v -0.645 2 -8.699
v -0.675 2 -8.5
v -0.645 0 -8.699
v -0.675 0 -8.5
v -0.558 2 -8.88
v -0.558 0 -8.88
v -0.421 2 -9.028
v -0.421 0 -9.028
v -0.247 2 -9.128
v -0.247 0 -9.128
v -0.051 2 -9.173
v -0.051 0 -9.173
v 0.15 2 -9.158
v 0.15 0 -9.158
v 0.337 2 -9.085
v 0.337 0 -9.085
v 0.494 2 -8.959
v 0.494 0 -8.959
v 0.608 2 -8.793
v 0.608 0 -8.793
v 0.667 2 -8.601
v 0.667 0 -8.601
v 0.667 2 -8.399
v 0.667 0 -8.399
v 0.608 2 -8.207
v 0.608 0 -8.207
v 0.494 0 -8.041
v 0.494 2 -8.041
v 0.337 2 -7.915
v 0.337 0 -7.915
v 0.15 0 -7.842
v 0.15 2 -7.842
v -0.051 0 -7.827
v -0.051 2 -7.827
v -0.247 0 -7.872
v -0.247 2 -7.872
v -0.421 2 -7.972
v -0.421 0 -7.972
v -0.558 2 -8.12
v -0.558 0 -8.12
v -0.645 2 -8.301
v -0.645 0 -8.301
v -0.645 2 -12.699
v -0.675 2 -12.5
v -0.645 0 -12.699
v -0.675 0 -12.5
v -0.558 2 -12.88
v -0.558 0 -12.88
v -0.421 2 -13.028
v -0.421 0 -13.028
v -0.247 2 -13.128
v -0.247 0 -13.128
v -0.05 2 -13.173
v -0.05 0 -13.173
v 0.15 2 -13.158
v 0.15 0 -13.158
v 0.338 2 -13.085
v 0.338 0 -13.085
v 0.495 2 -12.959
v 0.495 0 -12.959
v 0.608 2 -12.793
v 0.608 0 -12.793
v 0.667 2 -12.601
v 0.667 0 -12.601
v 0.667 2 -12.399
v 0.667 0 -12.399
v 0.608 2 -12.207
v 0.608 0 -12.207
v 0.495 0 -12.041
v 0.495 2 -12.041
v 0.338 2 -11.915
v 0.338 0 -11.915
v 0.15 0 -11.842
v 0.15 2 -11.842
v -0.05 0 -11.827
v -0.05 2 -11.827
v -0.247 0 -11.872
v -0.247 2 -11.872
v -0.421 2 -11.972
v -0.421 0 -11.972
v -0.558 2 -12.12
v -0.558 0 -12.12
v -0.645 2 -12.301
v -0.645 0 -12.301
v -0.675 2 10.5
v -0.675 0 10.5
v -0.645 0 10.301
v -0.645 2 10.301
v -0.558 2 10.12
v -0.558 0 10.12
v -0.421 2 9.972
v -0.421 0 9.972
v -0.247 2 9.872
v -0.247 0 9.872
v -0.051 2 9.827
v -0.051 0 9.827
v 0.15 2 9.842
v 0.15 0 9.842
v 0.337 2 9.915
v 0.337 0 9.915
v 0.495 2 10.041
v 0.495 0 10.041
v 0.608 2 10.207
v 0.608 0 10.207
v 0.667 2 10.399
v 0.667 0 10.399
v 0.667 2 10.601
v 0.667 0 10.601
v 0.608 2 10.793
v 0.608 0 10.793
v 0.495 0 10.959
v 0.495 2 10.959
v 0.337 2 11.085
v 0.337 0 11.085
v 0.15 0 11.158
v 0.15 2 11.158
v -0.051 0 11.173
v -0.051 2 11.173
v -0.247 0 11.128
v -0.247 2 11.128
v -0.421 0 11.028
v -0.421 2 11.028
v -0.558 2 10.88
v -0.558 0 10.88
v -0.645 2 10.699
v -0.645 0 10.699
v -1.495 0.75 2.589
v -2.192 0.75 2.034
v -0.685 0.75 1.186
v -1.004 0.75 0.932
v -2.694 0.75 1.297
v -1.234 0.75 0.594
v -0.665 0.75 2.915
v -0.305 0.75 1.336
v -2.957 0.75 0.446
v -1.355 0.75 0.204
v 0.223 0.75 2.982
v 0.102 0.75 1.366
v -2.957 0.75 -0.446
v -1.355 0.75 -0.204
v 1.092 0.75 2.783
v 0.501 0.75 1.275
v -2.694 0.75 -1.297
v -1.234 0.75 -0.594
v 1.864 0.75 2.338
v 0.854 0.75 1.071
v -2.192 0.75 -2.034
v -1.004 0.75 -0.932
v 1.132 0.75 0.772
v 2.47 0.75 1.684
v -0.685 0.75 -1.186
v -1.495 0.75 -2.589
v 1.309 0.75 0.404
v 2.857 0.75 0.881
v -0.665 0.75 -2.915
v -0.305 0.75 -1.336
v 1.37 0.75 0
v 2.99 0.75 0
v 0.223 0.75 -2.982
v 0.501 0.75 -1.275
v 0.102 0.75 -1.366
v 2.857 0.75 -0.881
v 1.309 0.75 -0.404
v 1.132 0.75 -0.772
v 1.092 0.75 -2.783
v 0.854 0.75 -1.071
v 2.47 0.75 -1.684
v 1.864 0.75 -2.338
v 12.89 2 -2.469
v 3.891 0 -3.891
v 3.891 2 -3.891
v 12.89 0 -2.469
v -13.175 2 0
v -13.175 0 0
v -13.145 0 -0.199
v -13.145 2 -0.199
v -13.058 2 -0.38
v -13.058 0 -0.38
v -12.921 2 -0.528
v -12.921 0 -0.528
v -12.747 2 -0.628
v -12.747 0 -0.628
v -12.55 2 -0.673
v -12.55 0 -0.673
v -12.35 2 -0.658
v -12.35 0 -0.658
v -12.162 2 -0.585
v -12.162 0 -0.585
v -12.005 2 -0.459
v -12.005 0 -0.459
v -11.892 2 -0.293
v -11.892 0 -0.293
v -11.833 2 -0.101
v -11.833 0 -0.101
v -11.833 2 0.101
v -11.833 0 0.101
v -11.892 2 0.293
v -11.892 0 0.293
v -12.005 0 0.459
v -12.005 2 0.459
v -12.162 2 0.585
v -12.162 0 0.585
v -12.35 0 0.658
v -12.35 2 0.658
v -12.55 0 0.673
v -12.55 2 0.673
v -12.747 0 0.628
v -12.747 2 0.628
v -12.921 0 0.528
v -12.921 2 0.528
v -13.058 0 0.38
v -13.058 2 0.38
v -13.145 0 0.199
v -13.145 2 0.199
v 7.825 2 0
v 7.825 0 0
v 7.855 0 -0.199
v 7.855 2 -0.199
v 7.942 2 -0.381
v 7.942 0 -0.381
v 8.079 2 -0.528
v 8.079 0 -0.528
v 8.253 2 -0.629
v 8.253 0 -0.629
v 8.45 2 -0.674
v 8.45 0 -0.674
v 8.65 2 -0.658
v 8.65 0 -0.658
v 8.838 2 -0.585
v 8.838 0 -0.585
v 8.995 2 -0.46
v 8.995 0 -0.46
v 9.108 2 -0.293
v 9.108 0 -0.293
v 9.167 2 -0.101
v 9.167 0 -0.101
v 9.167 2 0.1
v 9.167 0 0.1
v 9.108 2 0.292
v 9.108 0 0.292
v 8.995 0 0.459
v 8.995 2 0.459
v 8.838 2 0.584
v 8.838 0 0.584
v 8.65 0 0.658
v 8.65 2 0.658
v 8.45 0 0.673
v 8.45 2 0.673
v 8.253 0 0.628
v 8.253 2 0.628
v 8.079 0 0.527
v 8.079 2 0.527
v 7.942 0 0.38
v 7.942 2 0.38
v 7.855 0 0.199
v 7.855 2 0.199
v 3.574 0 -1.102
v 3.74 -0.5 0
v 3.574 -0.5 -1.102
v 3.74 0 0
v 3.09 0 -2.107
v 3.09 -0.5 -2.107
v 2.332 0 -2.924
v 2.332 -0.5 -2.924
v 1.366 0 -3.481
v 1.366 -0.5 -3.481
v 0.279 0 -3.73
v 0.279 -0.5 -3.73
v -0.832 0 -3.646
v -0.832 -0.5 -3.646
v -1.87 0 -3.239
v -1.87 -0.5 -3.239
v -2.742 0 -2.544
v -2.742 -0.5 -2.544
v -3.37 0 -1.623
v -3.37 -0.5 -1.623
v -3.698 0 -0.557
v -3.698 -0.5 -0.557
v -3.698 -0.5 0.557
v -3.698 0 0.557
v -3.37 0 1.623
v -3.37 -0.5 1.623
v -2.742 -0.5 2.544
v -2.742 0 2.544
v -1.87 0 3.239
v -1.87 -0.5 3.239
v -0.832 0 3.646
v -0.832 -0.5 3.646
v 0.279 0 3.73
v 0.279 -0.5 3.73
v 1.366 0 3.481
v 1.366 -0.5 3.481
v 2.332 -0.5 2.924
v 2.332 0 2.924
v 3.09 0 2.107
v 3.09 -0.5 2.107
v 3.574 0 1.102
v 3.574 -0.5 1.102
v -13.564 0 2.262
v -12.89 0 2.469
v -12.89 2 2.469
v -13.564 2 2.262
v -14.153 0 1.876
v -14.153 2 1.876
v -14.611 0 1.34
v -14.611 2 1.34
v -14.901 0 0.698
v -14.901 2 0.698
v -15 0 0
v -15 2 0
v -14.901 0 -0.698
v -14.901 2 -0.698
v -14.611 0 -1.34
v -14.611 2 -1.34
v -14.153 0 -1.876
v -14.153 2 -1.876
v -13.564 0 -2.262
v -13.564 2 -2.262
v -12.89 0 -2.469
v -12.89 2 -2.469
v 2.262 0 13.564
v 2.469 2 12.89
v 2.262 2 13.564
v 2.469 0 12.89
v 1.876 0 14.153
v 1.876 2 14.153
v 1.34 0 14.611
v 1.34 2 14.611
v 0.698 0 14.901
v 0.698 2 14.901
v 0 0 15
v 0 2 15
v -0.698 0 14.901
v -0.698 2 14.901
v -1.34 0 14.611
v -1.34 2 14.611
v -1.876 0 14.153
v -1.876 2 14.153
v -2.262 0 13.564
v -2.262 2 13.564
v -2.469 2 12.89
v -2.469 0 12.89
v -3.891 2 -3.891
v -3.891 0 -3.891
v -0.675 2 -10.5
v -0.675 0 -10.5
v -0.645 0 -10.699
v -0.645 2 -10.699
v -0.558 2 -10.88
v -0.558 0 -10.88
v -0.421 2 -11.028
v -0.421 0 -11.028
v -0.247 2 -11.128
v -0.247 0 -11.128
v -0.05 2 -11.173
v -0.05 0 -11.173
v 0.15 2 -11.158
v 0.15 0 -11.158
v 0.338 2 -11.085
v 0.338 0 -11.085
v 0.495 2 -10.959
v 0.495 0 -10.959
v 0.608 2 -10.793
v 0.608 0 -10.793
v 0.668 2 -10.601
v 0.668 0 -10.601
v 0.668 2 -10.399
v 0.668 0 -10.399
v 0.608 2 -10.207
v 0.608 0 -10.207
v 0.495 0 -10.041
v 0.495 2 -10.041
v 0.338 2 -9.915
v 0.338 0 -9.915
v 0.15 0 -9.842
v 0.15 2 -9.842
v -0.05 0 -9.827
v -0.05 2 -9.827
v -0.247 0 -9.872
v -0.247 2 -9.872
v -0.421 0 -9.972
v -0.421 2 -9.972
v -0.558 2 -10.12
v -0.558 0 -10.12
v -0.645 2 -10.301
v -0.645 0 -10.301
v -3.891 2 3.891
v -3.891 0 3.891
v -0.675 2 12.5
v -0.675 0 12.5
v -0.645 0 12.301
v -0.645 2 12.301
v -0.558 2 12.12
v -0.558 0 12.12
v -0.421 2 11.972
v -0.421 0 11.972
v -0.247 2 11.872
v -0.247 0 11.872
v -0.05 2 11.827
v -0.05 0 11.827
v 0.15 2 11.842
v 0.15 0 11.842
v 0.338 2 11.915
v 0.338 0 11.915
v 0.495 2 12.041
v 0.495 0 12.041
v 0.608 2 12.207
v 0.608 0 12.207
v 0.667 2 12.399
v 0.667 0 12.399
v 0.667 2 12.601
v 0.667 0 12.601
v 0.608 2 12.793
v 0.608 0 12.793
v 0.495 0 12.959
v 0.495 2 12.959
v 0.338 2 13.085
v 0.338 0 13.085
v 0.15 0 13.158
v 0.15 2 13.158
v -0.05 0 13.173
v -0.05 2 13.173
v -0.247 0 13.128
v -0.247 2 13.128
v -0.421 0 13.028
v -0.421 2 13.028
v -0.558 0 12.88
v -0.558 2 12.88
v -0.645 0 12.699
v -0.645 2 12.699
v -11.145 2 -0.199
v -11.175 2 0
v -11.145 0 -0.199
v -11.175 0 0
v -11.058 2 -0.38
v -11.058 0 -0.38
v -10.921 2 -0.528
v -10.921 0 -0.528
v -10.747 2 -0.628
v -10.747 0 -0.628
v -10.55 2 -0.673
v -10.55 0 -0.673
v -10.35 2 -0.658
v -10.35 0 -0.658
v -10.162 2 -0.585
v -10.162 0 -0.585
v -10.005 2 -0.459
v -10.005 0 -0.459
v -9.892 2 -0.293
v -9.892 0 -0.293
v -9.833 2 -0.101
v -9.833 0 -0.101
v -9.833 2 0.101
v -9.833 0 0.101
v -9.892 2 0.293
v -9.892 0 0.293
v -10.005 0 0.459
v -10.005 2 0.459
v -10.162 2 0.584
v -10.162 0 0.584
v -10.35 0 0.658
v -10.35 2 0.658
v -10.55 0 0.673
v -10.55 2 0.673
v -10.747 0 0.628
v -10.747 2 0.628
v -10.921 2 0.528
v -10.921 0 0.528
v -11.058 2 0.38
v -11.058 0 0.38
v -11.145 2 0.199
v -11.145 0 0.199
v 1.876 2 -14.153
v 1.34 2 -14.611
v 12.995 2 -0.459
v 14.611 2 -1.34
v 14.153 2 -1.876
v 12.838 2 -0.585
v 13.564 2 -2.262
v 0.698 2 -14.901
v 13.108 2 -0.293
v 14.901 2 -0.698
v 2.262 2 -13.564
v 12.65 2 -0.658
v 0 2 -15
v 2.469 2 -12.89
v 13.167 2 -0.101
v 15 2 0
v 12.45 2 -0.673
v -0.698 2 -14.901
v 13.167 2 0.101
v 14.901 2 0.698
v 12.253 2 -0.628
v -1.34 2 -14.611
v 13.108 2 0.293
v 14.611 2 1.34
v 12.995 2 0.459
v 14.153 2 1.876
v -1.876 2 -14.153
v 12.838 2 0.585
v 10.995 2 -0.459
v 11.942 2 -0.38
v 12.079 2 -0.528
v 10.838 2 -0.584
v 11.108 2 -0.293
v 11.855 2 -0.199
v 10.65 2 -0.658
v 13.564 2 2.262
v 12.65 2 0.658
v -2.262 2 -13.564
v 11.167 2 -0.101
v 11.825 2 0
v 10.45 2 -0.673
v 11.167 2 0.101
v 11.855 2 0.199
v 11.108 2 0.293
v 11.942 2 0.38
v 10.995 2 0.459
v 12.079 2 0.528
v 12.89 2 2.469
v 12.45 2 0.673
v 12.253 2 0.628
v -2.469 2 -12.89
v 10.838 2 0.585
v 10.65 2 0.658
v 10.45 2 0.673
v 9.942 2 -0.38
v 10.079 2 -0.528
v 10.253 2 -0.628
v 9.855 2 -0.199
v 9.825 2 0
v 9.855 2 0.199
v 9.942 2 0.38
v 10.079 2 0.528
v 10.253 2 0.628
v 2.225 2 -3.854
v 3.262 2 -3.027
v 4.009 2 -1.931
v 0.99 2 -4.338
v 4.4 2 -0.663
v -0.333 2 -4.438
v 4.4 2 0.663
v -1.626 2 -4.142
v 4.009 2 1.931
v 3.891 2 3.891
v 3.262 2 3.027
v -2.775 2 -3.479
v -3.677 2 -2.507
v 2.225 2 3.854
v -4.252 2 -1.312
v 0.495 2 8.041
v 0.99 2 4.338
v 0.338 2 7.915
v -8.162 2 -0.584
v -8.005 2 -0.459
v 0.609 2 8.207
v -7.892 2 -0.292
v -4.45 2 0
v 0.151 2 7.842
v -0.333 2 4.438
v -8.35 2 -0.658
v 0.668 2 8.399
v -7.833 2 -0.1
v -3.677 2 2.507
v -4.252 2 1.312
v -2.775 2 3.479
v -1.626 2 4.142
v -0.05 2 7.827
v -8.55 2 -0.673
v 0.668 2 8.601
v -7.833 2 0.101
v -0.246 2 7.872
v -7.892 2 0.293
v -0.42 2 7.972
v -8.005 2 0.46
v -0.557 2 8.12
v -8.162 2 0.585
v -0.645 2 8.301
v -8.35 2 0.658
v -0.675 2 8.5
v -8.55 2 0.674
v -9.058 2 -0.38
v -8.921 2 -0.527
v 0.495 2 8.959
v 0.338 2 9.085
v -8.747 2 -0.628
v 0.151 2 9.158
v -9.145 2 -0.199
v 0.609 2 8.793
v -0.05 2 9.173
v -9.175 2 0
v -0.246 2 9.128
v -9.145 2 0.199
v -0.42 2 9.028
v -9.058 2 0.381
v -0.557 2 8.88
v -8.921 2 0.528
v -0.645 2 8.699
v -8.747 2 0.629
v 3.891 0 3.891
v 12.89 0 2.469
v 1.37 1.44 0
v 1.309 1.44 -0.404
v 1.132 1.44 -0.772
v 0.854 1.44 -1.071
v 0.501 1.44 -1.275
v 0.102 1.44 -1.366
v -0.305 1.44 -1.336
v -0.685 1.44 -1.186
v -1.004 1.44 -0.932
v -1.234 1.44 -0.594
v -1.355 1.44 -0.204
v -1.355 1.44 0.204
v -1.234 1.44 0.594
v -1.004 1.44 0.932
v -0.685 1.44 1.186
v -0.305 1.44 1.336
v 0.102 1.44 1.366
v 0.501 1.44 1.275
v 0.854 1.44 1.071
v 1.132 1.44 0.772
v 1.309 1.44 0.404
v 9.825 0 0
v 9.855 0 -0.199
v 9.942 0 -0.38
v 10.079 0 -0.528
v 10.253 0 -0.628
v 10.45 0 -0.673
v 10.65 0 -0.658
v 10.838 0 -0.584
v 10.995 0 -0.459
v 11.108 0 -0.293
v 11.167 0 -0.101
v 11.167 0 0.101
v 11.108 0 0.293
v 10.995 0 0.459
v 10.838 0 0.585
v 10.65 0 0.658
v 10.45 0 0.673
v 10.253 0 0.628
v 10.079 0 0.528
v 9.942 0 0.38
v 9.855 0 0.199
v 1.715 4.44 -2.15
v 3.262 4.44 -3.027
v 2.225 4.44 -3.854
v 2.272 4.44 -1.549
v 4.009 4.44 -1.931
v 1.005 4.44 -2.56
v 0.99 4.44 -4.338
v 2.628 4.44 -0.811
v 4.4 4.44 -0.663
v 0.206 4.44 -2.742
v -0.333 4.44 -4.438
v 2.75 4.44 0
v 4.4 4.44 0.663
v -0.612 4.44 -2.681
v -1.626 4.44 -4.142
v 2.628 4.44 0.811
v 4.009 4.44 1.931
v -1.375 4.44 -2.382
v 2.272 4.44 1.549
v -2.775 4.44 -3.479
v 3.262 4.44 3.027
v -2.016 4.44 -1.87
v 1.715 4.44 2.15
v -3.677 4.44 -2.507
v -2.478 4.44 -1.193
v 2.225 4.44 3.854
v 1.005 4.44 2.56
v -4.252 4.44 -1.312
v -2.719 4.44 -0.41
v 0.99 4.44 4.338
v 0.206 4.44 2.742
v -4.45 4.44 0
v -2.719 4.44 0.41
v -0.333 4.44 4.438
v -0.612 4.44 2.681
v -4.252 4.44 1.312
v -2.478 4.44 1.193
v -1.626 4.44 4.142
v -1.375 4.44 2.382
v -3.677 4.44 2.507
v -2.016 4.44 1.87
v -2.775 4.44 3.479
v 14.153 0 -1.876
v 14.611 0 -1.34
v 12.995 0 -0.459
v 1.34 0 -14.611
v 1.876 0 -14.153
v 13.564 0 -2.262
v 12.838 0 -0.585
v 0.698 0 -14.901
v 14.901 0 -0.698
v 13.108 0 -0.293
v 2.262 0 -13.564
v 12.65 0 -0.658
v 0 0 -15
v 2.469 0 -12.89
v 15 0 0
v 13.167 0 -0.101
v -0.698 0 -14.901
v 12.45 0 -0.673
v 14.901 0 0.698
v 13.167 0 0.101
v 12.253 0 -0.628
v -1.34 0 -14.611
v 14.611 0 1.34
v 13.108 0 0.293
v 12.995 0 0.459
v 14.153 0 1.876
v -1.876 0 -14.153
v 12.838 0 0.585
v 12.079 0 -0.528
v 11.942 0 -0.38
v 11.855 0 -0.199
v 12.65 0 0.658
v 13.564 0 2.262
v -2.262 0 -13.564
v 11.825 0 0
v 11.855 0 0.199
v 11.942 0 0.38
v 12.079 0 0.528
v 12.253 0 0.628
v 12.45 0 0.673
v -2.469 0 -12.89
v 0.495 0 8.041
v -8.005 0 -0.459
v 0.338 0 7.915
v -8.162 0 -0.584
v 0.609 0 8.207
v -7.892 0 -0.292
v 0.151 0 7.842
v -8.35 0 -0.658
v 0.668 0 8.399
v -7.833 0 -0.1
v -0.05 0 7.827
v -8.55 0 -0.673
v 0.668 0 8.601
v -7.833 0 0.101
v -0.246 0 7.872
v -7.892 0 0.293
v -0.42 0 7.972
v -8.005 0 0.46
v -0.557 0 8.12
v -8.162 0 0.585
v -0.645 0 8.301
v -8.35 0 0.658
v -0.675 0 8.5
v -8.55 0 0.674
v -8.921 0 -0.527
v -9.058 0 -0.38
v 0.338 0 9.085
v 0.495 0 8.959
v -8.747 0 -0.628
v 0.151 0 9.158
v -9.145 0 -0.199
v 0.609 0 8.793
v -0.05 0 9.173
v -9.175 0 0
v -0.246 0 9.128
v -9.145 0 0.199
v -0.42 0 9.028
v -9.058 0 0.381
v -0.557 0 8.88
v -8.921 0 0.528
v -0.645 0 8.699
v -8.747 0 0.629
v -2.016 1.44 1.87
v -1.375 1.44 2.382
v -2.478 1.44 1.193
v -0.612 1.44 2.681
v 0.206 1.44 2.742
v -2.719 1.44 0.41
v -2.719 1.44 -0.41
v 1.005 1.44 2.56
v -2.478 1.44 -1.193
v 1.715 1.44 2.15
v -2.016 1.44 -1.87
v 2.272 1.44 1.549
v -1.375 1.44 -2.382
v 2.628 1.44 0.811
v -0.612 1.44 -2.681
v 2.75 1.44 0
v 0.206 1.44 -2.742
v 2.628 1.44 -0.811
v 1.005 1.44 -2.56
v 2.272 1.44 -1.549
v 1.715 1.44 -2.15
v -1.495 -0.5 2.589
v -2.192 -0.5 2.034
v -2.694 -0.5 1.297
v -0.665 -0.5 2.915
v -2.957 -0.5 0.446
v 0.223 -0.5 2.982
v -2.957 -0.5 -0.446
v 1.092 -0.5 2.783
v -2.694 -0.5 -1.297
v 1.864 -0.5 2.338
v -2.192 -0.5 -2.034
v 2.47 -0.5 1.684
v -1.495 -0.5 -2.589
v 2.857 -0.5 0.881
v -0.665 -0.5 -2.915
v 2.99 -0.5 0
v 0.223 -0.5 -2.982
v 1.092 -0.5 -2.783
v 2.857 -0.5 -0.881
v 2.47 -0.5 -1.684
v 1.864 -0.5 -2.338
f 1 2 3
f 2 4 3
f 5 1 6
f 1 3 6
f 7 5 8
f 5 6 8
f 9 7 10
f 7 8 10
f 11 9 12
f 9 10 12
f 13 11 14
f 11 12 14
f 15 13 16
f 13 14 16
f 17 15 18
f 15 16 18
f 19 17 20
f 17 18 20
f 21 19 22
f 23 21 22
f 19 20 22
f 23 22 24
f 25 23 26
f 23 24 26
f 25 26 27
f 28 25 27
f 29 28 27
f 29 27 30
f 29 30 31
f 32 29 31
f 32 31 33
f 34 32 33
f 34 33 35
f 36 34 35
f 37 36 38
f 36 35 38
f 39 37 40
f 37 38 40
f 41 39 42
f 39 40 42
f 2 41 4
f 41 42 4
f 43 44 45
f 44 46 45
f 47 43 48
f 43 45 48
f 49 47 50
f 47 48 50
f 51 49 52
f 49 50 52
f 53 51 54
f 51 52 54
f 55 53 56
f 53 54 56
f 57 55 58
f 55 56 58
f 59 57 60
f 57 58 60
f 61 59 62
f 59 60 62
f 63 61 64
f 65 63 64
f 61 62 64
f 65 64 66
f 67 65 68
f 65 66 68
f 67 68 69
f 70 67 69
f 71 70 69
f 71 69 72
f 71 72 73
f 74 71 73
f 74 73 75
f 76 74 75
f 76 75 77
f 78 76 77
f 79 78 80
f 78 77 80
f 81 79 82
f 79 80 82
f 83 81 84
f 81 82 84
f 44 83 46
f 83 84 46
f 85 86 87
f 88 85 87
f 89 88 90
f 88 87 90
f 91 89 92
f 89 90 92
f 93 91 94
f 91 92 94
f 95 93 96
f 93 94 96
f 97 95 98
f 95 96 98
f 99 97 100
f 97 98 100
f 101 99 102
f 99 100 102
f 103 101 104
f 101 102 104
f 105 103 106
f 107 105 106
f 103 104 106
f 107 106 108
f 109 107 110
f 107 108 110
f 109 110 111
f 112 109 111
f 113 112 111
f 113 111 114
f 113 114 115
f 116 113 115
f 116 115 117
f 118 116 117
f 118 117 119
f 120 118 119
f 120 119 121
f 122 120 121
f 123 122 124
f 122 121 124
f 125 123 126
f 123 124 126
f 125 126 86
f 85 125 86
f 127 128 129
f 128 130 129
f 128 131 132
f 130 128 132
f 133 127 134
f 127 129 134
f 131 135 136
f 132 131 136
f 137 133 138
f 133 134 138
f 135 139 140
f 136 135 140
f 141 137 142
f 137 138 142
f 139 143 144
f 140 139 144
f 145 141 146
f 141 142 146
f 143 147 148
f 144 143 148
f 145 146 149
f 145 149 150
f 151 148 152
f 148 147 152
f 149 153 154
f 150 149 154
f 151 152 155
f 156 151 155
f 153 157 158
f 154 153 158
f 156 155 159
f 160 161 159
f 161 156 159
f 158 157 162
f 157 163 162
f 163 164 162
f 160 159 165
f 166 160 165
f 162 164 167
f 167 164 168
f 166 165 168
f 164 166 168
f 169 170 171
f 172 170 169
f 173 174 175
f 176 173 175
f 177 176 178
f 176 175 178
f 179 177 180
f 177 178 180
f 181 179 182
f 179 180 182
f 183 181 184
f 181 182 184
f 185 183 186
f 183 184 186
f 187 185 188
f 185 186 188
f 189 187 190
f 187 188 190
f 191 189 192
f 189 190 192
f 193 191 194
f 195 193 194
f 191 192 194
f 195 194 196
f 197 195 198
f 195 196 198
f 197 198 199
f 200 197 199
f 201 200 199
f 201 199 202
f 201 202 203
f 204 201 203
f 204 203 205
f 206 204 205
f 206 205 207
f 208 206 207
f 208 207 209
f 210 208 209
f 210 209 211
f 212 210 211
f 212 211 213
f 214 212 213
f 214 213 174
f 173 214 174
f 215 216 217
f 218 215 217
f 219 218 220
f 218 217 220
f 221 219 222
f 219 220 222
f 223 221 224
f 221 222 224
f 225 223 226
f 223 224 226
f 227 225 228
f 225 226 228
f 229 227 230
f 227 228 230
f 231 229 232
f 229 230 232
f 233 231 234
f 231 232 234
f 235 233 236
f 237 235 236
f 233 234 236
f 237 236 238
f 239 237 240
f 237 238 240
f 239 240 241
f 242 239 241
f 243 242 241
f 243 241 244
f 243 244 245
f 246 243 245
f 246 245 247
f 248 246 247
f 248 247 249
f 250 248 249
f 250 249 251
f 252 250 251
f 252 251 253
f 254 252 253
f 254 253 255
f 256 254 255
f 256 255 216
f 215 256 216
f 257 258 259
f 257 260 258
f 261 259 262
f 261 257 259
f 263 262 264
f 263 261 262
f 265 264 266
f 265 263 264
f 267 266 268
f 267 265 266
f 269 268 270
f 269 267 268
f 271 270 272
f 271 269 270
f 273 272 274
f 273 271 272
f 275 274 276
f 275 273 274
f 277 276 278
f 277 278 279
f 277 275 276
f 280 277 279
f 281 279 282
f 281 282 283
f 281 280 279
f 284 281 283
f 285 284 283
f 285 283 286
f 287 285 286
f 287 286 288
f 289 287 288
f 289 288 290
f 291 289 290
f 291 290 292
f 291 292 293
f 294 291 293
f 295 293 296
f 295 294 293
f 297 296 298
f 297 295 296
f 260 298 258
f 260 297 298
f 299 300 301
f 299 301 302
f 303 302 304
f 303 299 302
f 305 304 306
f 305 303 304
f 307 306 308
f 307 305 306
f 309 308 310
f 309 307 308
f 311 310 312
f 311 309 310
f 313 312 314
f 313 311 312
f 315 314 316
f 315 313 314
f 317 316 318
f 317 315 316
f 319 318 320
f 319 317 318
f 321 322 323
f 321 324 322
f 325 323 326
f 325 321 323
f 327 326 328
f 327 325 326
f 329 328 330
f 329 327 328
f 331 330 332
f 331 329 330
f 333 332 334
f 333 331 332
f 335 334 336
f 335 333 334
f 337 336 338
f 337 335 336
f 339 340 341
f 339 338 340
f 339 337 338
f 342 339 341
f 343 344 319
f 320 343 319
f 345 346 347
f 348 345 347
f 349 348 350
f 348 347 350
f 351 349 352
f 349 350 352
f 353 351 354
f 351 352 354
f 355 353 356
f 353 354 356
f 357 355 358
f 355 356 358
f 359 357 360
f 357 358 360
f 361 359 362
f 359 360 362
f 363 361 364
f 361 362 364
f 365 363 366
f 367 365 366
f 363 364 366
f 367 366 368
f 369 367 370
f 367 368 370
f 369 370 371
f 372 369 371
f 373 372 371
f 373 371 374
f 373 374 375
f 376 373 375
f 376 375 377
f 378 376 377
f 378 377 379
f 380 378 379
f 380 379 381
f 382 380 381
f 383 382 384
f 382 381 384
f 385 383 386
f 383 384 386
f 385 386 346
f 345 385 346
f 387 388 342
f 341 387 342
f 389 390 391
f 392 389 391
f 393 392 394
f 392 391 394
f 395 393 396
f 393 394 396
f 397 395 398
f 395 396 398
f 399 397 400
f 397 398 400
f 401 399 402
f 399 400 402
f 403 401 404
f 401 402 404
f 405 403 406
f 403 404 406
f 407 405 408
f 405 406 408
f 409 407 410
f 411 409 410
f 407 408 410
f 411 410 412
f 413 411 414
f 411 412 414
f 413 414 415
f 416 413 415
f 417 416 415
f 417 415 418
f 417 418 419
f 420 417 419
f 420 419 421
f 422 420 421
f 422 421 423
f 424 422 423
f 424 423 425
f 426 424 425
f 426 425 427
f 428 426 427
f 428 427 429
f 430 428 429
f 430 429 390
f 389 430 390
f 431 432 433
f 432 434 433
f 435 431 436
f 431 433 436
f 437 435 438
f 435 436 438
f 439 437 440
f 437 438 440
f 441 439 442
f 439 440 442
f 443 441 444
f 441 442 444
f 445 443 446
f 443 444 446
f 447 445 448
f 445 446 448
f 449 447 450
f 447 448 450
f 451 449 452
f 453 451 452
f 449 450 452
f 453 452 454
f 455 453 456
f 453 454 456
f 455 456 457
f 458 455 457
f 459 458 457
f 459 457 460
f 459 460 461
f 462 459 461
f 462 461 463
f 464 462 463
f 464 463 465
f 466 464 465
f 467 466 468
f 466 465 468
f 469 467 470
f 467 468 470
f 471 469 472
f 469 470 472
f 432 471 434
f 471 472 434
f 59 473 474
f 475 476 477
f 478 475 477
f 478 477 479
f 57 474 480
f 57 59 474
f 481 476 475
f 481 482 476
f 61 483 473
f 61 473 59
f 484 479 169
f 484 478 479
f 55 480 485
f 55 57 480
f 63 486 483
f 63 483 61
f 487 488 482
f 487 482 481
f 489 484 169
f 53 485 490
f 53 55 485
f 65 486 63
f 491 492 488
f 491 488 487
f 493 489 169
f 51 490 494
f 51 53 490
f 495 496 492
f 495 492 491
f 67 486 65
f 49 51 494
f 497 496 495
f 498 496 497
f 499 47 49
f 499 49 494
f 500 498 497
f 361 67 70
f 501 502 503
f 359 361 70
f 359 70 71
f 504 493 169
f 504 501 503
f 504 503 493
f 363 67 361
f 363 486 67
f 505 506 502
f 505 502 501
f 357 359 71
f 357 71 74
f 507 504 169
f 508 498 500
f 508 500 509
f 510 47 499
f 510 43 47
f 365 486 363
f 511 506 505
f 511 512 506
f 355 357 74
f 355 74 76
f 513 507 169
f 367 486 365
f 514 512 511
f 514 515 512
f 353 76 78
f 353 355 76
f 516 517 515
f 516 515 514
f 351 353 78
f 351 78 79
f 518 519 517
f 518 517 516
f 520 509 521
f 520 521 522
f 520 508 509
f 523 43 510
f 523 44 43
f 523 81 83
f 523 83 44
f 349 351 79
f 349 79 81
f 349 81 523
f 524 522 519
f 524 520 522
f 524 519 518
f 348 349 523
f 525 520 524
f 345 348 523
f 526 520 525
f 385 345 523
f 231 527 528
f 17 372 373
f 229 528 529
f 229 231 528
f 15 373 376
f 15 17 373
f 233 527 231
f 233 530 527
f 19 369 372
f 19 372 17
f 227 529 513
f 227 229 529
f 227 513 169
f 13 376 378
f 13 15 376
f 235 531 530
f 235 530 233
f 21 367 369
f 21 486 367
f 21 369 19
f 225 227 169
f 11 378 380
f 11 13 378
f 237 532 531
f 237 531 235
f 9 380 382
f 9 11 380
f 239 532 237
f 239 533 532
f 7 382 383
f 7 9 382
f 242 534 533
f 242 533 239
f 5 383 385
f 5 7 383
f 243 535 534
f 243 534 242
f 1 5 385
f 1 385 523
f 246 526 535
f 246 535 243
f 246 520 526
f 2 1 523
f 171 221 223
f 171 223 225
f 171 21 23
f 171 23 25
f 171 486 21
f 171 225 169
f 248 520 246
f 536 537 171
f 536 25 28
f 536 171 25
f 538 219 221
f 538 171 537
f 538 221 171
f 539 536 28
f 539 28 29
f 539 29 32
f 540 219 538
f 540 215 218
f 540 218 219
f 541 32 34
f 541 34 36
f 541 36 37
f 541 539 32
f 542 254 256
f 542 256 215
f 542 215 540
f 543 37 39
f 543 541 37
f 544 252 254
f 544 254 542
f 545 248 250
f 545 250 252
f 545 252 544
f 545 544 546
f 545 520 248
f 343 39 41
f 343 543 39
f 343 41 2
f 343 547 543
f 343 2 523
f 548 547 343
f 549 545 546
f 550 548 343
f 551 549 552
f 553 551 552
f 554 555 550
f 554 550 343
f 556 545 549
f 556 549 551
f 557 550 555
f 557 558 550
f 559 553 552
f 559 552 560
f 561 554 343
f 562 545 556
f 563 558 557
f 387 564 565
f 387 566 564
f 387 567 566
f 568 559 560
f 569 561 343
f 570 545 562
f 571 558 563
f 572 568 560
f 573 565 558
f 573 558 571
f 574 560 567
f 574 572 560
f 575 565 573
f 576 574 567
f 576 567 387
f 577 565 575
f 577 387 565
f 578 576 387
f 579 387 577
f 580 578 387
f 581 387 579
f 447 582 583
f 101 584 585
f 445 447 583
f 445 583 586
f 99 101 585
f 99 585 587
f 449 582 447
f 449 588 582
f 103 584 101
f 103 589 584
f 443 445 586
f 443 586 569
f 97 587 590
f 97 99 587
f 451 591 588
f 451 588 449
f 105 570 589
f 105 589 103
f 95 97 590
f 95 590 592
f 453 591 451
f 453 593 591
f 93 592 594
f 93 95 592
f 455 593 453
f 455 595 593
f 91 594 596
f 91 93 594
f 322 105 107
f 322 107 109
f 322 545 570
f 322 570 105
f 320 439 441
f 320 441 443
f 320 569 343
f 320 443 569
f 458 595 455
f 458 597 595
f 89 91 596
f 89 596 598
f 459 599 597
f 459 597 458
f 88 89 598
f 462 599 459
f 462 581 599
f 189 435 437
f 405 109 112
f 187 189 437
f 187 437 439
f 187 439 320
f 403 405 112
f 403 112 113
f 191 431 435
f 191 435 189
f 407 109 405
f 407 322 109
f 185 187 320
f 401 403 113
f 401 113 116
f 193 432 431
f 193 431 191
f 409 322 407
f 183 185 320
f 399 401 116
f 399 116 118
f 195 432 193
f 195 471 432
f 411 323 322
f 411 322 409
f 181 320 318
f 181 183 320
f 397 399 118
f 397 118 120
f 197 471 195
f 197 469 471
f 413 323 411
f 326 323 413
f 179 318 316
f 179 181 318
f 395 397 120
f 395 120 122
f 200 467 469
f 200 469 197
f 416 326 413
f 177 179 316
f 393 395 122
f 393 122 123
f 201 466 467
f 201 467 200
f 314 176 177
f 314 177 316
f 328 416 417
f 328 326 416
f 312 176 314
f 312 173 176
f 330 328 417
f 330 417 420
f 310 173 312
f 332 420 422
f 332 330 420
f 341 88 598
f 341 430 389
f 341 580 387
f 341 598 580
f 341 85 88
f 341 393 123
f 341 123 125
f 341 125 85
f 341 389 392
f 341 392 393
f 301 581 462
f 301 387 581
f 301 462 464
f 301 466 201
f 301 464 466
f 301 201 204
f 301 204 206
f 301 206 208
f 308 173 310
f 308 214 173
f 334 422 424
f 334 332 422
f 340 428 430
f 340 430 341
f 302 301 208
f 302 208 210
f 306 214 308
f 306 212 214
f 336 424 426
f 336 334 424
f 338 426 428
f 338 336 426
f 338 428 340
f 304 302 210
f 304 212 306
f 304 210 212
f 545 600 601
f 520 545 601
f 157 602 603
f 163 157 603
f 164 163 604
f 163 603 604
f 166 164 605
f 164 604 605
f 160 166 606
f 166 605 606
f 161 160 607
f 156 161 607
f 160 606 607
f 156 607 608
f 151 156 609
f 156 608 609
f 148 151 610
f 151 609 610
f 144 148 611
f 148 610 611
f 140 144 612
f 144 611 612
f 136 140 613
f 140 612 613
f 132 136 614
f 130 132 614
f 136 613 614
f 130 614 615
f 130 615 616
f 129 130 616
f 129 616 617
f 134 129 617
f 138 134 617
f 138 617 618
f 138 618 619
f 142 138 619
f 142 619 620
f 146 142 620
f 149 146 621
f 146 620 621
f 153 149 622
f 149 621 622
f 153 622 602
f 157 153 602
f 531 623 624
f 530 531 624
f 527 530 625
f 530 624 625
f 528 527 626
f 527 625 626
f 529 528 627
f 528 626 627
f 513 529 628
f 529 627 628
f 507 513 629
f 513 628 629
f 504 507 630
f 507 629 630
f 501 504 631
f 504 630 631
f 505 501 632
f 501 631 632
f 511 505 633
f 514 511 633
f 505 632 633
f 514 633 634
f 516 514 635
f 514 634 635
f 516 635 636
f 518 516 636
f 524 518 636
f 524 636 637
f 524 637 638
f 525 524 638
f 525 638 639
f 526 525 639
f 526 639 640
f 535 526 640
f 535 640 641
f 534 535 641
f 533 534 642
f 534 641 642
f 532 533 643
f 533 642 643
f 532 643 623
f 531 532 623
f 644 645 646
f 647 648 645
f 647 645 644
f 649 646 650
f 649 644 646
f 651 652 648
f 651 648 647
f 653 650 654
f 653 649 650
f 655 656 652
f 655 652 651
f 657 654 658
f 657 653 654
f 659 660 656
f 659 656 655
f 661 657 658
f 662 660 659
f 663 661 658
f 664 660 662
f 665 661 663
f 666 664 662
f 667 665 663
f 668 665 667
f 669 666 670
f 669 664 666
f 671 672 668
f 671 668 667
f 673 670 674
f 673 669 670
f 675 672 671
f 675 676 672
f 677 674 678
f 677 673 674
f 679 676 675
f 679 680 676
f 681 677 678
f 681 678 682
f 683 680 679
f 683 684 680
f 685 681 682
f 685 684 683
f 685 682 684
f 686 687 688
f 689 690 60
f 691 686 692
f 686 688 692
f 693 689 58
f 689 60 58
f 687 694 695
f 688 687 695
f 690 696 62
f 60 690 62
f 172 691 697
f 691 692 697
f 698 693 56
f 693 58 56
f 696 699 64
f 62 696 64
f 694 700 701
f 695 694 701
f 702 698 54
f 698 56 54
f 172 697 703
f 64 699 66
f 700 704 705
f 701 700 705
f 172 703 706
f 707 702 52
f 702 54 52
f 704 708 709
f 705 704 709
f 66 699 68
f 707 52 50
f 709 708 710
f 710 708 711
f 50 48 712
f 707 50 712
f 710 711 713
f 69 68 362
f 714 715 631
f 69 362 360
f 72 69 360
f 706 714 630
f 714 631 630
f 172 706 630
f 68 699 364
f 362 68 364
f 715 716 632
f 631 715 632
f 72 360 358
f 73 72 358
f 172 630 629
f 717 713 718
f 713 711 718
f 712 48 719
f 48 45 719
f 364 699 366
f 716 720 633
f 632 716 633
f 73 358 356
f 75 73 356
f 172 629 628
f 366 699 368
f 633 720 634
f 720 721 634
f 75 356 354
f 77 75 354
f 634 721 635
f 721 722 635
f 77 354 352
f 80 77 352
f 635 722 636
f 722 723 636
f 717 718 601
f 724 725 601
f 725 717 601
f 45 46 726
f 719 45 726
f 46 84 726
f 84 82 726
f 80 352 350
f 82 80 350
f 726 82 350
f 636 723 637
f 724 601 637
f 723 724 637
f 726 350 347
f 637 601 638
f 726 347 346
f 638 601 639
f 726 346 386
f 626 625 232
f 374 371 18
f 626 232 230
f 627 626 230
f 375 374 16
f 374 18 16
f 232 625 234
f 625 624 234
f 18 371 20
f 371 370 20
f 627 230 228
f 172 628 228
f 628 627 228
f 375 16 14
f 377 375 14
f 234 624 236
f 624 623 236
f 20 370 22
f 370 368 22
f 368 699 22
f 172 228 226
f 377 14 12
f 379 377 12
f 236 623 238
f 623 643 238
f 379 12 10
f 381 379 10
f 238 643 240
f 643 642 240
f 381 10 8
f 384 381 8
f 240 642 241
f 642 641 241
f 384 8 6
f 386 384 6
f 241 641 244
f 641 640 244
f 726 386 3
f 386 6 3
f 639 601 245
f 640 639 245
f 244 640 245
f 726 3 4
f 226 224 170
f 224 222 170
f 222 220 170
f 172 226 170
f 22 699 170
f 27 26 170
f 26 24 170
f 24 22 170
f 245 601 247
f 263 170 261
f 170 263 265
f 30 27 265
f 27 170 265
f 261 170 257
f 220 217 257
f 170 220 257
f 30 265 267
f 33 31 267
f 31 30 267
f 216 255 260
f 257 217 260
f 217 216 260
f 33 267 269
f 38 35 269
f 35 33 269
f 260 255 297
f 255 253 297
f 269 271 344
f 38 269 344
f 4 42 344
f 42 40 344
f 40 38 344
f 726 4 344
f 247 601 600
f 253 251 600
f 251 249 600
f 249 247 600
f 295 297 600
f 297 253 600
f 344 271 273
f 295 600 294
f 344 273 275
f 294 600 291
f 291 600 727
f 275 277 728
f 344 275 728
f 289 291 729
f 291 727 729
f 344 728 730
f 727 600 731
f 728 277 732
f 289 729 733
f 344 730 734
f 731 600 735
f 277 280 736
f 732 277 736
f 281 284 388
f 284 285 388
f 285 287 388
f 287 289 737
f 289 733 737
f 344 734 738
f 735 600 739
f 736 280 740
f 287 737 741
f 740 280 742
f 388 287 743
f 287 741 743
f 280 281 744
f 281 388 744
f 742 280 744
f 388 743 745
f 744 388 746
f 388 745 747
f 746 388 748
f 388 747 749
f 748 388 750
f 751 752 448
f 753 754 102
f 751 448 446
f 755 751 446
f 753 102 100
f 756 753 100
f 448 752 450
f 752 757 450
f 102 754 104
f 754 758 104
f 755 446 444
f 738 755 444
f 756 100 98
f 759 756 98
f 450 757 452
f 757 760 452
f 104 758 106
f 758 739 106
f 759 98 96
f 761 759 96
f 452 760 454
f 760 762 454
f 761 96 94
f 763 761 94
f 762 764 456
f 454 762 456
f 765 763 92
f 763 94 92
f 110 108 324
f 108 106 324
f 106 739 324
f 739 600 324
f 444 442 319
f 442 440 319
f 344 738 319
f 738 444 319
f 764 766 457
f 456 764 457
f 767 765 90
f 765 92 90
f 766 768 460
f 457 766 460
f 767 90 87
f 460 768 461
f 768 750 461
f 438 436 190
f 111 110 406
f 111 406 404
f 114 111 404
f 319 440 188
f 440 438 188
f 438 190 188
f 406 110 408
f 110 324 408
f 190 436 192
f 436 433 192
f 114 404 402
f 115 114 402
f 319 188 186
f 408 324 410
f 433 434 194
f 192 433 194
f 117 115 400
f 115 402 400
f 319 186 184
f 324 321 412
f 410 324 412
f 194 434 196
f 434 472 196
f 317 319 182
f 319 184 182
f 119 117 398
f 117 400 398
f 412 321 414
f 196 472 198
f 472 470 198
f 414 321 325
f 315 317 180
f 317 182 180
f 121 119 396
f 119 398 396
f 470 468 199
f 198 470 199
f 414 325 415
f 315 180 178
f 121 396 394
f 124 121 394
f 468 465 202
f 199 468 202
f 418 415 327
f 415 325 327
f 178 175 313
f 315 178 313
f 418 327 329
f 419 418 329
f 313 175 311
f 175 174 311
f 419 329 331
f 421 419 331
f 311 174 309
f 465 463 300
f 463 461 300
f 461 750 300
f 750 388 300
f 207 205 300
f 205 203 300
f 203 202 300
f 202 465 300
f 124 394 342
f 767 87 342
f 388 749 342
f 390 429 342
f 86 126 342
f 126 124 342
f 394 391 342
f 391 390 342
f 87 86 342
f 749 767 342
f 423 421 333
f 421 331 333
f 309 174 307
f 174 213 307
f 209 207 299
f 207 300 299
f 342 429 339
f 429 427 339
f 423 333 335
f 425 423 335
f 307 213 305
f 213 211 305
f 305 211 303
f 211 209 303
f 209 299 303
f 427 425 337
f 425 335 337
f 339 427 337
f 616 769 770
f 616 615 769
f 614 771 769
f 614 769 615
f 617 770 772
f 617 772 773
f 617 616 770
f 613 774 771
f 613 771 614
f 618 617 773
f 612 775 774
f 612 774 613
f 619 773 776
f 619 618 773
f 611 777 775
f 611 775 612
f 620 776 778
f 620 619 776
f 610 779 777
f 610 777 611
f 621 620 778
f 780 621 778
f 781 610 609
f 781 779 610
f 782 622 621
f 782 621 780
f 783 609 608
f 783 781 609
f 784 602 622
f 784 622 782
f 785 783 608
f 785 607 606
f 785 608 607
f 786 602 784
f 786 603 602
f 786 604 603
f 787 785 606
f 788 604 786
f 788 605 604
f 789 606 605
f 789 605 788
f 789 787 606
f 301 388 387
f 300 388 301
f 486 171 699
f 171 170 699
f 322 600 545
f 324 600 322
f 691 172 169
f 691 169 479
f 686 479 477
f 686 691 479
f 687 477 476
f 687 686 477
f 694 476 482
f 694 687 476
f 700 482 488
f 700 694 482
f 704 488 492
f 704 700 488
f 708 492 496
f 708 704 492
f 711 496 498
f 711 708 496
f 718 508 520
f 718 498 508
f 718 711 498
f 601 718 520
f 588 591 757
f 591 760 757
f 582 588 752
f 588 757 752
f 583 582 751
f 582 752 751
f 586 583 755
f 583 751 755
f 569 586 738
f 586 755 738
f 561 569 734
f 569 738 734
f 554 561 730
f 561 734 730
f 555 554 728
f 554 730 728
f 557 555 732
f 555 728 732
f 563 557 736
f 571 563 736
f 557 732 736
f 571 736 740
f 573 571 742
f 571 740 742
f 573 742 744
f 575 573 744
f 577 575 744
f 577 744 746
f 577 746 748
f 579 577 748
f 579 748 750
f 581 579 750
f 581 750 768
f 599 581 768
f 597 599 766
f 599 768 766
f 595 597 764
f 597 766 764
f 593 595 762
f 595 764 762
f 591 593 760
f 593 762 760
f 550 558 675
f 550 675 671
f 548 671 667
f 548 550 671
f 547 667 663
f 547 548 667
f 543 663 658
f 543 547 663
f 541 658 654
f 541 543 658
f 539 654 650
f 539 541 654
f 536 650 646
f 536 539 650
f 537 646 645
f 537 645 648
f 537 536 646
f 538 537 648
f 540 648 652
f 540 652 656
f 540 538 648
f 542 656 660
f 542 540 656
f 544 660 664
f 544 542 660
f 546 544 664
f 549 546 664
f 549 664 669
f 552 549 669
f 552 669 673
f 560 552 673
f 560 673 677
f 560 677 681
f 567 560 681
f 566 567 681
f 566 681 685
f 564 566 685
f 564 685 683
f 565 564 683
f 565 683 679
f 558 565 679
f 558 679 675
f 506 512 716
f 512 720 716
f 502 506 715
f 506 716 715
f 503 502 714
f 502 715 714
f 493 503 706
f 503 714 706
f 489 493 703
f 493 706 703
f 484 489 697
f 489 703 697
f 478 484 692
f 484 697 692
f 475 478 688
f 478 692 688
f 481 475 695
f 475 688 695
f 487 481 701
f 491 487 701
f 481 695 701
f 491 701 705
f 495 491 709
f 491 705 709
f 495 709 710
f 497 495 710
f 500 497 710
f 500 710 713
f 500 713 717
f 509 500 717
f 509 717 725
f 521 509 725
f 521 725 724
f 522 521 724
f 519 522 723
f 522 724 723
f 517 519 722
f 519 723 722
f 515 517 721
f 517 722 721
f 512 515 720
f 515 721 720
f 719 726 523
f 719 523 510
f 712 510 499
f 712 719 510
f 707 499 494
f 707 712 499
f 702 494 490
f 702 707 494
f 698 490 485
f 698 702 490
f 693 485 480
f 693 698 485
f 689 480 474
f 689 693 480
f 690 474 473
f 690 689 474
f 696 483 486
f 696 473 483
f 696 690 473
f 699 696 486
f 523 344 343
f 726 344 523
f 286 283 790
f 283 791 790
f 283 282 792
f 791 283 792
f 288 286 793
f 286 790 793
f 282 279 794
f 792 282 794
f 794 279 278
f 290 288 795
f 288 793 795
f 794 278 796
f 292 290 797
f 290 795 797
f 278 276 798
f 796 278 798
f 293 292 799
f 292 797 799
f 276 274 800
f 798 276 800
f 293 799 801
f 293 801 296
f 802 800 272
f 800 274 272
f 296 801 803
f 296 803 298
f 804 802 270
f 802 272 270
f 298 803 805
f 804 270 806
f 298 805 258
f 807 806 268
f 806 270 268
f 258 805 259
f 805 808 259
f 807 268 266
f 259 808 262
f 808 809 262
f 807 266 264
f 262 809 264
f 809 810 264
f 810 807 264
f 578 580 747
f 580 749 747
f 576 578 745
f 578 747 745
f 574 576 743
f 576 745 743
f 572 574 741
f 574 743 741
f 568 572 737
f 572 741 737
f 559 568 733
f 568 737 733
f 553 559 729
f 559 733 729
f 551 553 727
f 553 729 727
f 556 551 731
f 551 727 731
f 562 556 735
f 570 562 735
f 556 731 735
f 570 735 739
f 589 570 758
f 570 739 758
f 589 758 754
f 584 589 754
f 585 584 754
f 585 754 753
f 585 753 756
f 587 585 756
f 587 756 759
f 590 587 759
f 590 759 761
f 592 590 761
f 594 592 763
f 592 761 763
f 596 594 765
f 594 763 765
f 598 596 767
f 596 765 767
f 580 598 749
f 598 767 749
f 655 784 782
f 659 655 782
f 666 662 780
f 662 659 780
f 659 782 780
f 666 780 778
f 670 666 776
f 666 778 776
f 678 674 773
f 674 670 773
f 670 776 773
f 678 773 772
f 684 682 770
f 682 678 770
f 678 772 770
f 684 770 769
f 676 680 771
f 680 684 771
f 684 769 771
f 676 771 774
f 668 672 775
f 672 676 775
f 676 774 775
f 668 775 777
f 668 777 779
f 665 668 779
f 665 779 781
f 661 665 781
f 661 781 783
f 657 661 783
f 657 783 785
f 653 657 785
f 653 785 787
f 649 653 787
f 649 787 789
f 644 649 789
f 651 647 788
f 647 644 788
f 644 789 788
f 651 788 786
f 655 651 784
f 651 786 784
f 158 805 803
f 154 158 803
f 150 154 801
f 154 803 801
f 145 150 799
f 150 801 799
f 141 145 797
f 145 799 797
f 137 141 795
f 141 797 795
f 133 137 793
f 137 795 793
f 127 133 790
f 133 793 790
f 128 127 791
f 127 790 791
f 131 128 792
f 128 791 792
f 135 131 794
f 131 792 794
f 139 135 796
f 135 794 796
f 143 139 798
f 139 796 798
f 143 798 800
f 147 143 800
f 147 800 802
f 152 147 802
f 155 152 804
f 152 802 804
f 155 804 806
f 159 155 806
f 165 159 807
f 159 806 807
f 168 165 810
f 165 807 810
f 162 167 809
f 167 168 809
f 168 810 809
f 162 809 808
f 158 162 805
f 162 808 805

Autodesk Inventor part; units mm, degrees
ref_plane "YZ Plane" through (0, 0, 0) normal (1, 0, 0) x (0, 1, 0)
ref_plane "XZ Plane" through (0, 0, 0) normal (0, 1, 0) x (-1, 0, 0)
ref_plane "XY Plane" through (0, 0, 0) normal (0, 0, 1) x (1, 0, 0)
sketch "Sketch1" plane through (0, 0, 0) normal (0, 1, 0) x (-1, 0, 0)
  circle A0 centre (0, 0) radius 3.74
  circle A1 centre (0, 0) radius 4.45
  circle A2 centre (0, 0) radius 8.5
  circle A3 centre (0, 0) radius 10.5
  circle A4 centre (0, 0) radius 12.5
  circle A5 centre (12.5, 0) radius 2.5
  line L0 (0.6942, 4.3955) -> (12.89, 2.4694)
  line L1 (0.6942, -4.3955) -> (12.89, -2.4694)
  circle A6 centre (12.5, 0) radius 0.675
  circle A7 centre (10.5, -0.0001) radius 0.675
  circle A8 centre (8.5, 0.0004) radius 0.675
  line L2 (-4.3955, 0.6942) -> (-2.4694, 12.89)
  circle A9 centre (0, 12.5) radius 2.5
  circle A10 centre (0, 12.5) radius 0.675
  circle A11 centre (0.0001, 10.5) radius 0.675
  circle A12 centre (-0.0004, 8.5) radius 0.675
  line L3 (4.3955, 0.6942) -> (2.4694, 12.89)
  line L4 (-0.6942, -4.3955) -> (-12.89, -2.4694)
  circle A13 centre (-12.5, 0) radius 2.5
  circle A14 centre (-12.5, 0) radius 0.675
  circle A15 centre (-10.5, 0.0001) radius 0.675
  circle A16 centre (-8.5, -0.0004) radius 0.675
  line L5 (-0.6942, 4.3955) -> (-12.89, 2.4694)
  line L6 (4.3955, -0.6942) -> (2.4694, -12.89)
  circle A17 centre (0, -12.5) radius 2.5
  circle A18 centre (0, -12.5) radius 0.675
  circle A19 centre (-0.0001, -10.5) radius 0.675
  circle A20 centre (0.0004, -8.5) radius 0.675
  line L7 (-4.3955, -0.6942) -> (-2.4694, -12.89)
  point P0 (3.8907, 3.8907)
  point P1 (-3.8907, 3.8907)
  point P2 (-3.8907, -3.8907)
  point P3 (3.8907, -3.8907)
  dimension "d5" = 17
  dimension "d6" = 21
  dimension "d7" = 25
  dimension "d3" = 7.48
  dimension "d4" = 8.9
  dimension "d8" = 5
  dimension "d11" = 1.35
  dimension "d12" = 1.35
  dimension "d13" = 1.35
  dimension "d16" = 360
extrude "Extrusion1" add sketch "Sketch1" along normal blind 2 contours A1 L3 L0 A2 A8 L1 L6 | A1 L0 L3 | L6 L1 A1 | A1 L5 L2 A2 A12 L3 L0 | L1 L6 A2 A20 L7 L4 A1 | A1 L2 L5 | L0 A3 A5 A7 L1 A2 A8 | A2 A12 L2 A3 A9 A11 L3 | L4 L7 A1 | L6 A3 A17 A19 L7 A2 A20 | A1 L7 L4 A2 A16 L5 L2 | L0 A4 A5 A3 | A3 A9 A4 L3 | A3 A5 A4 L1 | L6 A4 A17 A3 | A2 A16 L4 A3 A13 A15 L5 | A5 A4 A6 A3 A7 | A3 A7 A5 | L0 A5 A4 | A9 A11 A3 | A3 A11 A9 A4 A10 | A4 A9 L3 | A5 A7 A3 | A4 A5 L1 | A17 A4 A18 A3 A19 | A3 A19 A17 | L6 A17 A4 | L2 A4 A9 A3 | A3 A13 A4 L5 | A5 A4 A6 | A4 A10 A9 | L4 A4 A13 A3 | A3 A17 A4 L7 | A17 A4 A18 | A3 A11 A9 | L2 A9 A4 | A13 A15 A3 | A3 A15 A13 A4 A14 | A4 A13 L5 | A3 A15 A13 | L4 A13 A4 | A17 A19 A3 | A4 A17 L7 | A4 A14 A13 picked at (10.283, 0.9379) picked at (0.938, 10.2831) picked at (10.2831, -0.938) picked at (0.9379, -10.283) picked at (-0.9379, 10.283) picked at (-10.2831, 0.938) picked at (-10.283, -0.9379) picked at (-0.938, -10.2831)
extrude "Extrusion2" add sketch "Sketch1" along normal blind 4.44 contours A1
ref_plane "Work Plane2" through (0, 1.44, 0) normal (0, 1, 0) x (1, 0, 0)
sketch "Sketch3" plane through (0, 1.44, 0) normal (0, 1, 0) x (1, 0, 0)
  circle A0 centre (0, 0) radius 1.37
  circle A1 centre (0, 0) radius 2.75
  circle A2 centre (0, 0) radius 2.99
  circle A3 centre (0, 0) radius 3.74
  dimension "d32" = 2.74
  dimension "d33" = 5.5
  dimension "d34" = 5.98
  dimension "d35" = 7.48
extrude "Extrusion6" add sketch "Sketch3" along normal blind 3 and the other way blind 1.94 contours A3
extrude "Extrusion7" add sketch "Sketch3" along normal blind 3 and the other way blind 0.69 contours A2
extrude "Extrusion8" add sketch "Sketch3" against normal blind 0.69 contours A1
properties part number "Standard Servo Horn - White Cross"
